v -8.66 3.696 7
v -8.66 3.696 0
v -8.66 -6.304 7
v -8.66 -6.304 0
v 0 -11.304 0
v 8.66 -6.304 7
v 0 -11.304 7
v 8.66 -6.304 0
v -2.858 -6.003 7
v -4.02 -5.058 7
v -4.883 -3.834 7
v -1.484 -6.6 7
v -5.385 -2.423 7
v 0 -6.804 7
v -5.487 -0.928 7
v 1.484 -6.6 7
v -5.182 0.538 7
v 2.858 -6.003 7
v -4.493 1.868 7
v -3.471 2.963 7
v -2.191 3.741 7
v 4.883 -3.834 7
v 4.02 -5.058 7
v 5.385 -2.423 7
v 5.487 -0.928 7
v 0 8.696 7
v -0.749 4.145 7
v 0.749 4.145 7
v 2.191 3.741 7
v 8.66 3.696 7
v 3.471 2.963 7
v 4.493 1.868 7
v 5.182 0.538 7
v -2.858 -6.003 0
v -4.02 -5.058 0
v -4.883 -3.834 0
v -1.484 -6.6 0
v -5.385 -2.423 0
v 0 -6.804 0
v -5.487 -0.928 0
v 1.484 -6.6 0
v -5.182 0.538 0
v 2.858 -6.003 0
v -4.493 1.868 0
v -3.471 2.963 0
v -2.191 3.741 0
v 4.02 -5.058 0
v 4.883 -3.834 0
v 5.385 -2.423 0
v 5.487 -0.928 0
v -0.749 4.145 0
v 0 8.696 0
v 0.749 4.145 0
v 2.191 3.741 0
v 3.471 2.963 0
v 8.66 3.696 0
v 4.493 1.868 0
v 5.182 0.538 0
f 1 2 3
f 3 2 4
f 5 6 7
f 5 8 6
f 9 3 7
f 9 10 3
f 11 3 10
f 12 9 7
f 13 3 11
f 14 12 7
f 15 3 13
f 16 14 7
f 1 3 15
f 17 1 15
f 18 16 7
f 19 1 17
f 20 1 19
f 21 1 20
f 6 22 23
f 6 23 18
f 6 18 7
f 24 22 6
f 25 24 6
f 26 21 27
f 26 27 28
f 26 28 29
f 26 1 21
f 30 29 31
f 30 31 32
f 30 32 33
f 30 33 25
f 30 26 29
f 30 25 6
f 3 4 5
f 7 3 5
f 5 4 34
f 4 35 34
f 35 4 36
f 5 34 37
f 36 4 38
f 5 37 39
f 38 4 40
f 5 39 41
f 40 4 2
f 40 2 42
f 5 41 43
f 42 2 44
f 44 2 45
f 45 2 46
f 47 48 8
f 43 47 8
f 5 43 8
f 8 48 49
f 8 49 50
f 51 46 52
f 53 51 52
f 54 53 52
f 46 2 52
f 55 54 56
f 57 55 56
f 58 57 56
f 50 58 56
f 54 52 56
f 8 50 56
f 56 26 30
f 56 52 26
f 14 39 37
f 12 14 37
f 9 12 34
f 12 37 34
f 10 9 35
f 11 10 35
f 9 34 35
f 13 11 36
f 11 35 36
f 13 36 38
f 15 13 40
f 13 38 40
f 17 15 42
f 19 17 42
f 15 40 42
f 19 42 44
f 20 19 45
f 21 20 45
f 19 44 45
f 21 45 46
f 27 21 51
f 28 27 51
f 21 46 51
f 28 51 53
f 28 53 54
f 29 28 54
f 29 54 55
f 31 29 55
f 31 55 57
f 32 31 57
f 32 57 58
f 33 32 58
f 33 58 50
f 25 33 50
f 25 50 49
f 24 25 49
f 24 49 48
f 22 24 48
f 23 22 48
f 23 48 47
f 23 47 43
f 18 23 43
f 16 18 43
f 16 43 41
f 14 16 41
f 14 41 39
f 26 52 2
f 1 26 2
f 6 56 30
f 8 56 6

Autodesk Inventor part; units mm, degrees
ref_plane "YZ Plane" through (0, 0, 0) normal (1, 0, 0) x (0, 1, 0)
ref_plane "XZ Plane" through (0, 0, 0) normal (0, 1, 0) x (-1, 0, 0)
ref_plane "XY Plane" through (0, 0, 0) normal (0, 0, 1) x (1, 0, 0)
sketch "Sketch1" plane through (0, 0, 0) normal (0, 0, 1) x (1, 0, 0)
  line L0 (0, 12.846) -> (0, -12.1789)
  line L1 (0, 8.6963) -> (-8.6603, 3.6963)
  line L2 (-8.6603, 3.6963) -> (-8.6603, -6.3037)
  line L3 (-8.6603, -6.3037) -> (0, -11.3037)
  line L4 (0, 8.6963) -> (8.6603, 3.6963)
  line L5 (8.6603, 3.6963) -> (8.6603, -6.3037)
  line L6 (8.6603, -6.3037) -> (0, -11.3037)
  point P0 (0, 0)
  dimension "d0" = 120
  dimension "d1" = 120
  dimension "d2" = 10
  dimension "d4" = 5
  dimension "d16" = 9.7893
  dimension "d17" = 20.9142
  dimension "d18" = 0.758
extrude "Extrusion1" add sketch "Sketch1" along normal blind 7
sketch "Sketch2" plane through (0, 0, 7) normal (0, 0, 1) x (1, 0, 0)
  line L0 (0, 10.2692) -> (0, -14.045)
  line L1 (8.6603, -6.3037) -> (8.6603, 3.6963) projected
  line L2 (8.6603, -1.3037) -> (-8.6603, -1.3037)
  line L3 (-8.6603, 3.6963) -> (-8.6603, -6.3037) projected
  point P0 (0, 0)
  point P1 (0, -1.3037)
  dimension "d22" = 8.6602
  dimension "d23" = 23.1456
  dimension "d24" = 25.4826
hole "Hole1" at (0, -1.3037, 7) direction (0, 0, -1) diameter 11 end through all
thread "Thread2" size "M11x1.5" class "6H" standard "ANSI Metric M Profile" full length
equation "\"d4\" = 0.5 * d2"
properties part number "mutter"
